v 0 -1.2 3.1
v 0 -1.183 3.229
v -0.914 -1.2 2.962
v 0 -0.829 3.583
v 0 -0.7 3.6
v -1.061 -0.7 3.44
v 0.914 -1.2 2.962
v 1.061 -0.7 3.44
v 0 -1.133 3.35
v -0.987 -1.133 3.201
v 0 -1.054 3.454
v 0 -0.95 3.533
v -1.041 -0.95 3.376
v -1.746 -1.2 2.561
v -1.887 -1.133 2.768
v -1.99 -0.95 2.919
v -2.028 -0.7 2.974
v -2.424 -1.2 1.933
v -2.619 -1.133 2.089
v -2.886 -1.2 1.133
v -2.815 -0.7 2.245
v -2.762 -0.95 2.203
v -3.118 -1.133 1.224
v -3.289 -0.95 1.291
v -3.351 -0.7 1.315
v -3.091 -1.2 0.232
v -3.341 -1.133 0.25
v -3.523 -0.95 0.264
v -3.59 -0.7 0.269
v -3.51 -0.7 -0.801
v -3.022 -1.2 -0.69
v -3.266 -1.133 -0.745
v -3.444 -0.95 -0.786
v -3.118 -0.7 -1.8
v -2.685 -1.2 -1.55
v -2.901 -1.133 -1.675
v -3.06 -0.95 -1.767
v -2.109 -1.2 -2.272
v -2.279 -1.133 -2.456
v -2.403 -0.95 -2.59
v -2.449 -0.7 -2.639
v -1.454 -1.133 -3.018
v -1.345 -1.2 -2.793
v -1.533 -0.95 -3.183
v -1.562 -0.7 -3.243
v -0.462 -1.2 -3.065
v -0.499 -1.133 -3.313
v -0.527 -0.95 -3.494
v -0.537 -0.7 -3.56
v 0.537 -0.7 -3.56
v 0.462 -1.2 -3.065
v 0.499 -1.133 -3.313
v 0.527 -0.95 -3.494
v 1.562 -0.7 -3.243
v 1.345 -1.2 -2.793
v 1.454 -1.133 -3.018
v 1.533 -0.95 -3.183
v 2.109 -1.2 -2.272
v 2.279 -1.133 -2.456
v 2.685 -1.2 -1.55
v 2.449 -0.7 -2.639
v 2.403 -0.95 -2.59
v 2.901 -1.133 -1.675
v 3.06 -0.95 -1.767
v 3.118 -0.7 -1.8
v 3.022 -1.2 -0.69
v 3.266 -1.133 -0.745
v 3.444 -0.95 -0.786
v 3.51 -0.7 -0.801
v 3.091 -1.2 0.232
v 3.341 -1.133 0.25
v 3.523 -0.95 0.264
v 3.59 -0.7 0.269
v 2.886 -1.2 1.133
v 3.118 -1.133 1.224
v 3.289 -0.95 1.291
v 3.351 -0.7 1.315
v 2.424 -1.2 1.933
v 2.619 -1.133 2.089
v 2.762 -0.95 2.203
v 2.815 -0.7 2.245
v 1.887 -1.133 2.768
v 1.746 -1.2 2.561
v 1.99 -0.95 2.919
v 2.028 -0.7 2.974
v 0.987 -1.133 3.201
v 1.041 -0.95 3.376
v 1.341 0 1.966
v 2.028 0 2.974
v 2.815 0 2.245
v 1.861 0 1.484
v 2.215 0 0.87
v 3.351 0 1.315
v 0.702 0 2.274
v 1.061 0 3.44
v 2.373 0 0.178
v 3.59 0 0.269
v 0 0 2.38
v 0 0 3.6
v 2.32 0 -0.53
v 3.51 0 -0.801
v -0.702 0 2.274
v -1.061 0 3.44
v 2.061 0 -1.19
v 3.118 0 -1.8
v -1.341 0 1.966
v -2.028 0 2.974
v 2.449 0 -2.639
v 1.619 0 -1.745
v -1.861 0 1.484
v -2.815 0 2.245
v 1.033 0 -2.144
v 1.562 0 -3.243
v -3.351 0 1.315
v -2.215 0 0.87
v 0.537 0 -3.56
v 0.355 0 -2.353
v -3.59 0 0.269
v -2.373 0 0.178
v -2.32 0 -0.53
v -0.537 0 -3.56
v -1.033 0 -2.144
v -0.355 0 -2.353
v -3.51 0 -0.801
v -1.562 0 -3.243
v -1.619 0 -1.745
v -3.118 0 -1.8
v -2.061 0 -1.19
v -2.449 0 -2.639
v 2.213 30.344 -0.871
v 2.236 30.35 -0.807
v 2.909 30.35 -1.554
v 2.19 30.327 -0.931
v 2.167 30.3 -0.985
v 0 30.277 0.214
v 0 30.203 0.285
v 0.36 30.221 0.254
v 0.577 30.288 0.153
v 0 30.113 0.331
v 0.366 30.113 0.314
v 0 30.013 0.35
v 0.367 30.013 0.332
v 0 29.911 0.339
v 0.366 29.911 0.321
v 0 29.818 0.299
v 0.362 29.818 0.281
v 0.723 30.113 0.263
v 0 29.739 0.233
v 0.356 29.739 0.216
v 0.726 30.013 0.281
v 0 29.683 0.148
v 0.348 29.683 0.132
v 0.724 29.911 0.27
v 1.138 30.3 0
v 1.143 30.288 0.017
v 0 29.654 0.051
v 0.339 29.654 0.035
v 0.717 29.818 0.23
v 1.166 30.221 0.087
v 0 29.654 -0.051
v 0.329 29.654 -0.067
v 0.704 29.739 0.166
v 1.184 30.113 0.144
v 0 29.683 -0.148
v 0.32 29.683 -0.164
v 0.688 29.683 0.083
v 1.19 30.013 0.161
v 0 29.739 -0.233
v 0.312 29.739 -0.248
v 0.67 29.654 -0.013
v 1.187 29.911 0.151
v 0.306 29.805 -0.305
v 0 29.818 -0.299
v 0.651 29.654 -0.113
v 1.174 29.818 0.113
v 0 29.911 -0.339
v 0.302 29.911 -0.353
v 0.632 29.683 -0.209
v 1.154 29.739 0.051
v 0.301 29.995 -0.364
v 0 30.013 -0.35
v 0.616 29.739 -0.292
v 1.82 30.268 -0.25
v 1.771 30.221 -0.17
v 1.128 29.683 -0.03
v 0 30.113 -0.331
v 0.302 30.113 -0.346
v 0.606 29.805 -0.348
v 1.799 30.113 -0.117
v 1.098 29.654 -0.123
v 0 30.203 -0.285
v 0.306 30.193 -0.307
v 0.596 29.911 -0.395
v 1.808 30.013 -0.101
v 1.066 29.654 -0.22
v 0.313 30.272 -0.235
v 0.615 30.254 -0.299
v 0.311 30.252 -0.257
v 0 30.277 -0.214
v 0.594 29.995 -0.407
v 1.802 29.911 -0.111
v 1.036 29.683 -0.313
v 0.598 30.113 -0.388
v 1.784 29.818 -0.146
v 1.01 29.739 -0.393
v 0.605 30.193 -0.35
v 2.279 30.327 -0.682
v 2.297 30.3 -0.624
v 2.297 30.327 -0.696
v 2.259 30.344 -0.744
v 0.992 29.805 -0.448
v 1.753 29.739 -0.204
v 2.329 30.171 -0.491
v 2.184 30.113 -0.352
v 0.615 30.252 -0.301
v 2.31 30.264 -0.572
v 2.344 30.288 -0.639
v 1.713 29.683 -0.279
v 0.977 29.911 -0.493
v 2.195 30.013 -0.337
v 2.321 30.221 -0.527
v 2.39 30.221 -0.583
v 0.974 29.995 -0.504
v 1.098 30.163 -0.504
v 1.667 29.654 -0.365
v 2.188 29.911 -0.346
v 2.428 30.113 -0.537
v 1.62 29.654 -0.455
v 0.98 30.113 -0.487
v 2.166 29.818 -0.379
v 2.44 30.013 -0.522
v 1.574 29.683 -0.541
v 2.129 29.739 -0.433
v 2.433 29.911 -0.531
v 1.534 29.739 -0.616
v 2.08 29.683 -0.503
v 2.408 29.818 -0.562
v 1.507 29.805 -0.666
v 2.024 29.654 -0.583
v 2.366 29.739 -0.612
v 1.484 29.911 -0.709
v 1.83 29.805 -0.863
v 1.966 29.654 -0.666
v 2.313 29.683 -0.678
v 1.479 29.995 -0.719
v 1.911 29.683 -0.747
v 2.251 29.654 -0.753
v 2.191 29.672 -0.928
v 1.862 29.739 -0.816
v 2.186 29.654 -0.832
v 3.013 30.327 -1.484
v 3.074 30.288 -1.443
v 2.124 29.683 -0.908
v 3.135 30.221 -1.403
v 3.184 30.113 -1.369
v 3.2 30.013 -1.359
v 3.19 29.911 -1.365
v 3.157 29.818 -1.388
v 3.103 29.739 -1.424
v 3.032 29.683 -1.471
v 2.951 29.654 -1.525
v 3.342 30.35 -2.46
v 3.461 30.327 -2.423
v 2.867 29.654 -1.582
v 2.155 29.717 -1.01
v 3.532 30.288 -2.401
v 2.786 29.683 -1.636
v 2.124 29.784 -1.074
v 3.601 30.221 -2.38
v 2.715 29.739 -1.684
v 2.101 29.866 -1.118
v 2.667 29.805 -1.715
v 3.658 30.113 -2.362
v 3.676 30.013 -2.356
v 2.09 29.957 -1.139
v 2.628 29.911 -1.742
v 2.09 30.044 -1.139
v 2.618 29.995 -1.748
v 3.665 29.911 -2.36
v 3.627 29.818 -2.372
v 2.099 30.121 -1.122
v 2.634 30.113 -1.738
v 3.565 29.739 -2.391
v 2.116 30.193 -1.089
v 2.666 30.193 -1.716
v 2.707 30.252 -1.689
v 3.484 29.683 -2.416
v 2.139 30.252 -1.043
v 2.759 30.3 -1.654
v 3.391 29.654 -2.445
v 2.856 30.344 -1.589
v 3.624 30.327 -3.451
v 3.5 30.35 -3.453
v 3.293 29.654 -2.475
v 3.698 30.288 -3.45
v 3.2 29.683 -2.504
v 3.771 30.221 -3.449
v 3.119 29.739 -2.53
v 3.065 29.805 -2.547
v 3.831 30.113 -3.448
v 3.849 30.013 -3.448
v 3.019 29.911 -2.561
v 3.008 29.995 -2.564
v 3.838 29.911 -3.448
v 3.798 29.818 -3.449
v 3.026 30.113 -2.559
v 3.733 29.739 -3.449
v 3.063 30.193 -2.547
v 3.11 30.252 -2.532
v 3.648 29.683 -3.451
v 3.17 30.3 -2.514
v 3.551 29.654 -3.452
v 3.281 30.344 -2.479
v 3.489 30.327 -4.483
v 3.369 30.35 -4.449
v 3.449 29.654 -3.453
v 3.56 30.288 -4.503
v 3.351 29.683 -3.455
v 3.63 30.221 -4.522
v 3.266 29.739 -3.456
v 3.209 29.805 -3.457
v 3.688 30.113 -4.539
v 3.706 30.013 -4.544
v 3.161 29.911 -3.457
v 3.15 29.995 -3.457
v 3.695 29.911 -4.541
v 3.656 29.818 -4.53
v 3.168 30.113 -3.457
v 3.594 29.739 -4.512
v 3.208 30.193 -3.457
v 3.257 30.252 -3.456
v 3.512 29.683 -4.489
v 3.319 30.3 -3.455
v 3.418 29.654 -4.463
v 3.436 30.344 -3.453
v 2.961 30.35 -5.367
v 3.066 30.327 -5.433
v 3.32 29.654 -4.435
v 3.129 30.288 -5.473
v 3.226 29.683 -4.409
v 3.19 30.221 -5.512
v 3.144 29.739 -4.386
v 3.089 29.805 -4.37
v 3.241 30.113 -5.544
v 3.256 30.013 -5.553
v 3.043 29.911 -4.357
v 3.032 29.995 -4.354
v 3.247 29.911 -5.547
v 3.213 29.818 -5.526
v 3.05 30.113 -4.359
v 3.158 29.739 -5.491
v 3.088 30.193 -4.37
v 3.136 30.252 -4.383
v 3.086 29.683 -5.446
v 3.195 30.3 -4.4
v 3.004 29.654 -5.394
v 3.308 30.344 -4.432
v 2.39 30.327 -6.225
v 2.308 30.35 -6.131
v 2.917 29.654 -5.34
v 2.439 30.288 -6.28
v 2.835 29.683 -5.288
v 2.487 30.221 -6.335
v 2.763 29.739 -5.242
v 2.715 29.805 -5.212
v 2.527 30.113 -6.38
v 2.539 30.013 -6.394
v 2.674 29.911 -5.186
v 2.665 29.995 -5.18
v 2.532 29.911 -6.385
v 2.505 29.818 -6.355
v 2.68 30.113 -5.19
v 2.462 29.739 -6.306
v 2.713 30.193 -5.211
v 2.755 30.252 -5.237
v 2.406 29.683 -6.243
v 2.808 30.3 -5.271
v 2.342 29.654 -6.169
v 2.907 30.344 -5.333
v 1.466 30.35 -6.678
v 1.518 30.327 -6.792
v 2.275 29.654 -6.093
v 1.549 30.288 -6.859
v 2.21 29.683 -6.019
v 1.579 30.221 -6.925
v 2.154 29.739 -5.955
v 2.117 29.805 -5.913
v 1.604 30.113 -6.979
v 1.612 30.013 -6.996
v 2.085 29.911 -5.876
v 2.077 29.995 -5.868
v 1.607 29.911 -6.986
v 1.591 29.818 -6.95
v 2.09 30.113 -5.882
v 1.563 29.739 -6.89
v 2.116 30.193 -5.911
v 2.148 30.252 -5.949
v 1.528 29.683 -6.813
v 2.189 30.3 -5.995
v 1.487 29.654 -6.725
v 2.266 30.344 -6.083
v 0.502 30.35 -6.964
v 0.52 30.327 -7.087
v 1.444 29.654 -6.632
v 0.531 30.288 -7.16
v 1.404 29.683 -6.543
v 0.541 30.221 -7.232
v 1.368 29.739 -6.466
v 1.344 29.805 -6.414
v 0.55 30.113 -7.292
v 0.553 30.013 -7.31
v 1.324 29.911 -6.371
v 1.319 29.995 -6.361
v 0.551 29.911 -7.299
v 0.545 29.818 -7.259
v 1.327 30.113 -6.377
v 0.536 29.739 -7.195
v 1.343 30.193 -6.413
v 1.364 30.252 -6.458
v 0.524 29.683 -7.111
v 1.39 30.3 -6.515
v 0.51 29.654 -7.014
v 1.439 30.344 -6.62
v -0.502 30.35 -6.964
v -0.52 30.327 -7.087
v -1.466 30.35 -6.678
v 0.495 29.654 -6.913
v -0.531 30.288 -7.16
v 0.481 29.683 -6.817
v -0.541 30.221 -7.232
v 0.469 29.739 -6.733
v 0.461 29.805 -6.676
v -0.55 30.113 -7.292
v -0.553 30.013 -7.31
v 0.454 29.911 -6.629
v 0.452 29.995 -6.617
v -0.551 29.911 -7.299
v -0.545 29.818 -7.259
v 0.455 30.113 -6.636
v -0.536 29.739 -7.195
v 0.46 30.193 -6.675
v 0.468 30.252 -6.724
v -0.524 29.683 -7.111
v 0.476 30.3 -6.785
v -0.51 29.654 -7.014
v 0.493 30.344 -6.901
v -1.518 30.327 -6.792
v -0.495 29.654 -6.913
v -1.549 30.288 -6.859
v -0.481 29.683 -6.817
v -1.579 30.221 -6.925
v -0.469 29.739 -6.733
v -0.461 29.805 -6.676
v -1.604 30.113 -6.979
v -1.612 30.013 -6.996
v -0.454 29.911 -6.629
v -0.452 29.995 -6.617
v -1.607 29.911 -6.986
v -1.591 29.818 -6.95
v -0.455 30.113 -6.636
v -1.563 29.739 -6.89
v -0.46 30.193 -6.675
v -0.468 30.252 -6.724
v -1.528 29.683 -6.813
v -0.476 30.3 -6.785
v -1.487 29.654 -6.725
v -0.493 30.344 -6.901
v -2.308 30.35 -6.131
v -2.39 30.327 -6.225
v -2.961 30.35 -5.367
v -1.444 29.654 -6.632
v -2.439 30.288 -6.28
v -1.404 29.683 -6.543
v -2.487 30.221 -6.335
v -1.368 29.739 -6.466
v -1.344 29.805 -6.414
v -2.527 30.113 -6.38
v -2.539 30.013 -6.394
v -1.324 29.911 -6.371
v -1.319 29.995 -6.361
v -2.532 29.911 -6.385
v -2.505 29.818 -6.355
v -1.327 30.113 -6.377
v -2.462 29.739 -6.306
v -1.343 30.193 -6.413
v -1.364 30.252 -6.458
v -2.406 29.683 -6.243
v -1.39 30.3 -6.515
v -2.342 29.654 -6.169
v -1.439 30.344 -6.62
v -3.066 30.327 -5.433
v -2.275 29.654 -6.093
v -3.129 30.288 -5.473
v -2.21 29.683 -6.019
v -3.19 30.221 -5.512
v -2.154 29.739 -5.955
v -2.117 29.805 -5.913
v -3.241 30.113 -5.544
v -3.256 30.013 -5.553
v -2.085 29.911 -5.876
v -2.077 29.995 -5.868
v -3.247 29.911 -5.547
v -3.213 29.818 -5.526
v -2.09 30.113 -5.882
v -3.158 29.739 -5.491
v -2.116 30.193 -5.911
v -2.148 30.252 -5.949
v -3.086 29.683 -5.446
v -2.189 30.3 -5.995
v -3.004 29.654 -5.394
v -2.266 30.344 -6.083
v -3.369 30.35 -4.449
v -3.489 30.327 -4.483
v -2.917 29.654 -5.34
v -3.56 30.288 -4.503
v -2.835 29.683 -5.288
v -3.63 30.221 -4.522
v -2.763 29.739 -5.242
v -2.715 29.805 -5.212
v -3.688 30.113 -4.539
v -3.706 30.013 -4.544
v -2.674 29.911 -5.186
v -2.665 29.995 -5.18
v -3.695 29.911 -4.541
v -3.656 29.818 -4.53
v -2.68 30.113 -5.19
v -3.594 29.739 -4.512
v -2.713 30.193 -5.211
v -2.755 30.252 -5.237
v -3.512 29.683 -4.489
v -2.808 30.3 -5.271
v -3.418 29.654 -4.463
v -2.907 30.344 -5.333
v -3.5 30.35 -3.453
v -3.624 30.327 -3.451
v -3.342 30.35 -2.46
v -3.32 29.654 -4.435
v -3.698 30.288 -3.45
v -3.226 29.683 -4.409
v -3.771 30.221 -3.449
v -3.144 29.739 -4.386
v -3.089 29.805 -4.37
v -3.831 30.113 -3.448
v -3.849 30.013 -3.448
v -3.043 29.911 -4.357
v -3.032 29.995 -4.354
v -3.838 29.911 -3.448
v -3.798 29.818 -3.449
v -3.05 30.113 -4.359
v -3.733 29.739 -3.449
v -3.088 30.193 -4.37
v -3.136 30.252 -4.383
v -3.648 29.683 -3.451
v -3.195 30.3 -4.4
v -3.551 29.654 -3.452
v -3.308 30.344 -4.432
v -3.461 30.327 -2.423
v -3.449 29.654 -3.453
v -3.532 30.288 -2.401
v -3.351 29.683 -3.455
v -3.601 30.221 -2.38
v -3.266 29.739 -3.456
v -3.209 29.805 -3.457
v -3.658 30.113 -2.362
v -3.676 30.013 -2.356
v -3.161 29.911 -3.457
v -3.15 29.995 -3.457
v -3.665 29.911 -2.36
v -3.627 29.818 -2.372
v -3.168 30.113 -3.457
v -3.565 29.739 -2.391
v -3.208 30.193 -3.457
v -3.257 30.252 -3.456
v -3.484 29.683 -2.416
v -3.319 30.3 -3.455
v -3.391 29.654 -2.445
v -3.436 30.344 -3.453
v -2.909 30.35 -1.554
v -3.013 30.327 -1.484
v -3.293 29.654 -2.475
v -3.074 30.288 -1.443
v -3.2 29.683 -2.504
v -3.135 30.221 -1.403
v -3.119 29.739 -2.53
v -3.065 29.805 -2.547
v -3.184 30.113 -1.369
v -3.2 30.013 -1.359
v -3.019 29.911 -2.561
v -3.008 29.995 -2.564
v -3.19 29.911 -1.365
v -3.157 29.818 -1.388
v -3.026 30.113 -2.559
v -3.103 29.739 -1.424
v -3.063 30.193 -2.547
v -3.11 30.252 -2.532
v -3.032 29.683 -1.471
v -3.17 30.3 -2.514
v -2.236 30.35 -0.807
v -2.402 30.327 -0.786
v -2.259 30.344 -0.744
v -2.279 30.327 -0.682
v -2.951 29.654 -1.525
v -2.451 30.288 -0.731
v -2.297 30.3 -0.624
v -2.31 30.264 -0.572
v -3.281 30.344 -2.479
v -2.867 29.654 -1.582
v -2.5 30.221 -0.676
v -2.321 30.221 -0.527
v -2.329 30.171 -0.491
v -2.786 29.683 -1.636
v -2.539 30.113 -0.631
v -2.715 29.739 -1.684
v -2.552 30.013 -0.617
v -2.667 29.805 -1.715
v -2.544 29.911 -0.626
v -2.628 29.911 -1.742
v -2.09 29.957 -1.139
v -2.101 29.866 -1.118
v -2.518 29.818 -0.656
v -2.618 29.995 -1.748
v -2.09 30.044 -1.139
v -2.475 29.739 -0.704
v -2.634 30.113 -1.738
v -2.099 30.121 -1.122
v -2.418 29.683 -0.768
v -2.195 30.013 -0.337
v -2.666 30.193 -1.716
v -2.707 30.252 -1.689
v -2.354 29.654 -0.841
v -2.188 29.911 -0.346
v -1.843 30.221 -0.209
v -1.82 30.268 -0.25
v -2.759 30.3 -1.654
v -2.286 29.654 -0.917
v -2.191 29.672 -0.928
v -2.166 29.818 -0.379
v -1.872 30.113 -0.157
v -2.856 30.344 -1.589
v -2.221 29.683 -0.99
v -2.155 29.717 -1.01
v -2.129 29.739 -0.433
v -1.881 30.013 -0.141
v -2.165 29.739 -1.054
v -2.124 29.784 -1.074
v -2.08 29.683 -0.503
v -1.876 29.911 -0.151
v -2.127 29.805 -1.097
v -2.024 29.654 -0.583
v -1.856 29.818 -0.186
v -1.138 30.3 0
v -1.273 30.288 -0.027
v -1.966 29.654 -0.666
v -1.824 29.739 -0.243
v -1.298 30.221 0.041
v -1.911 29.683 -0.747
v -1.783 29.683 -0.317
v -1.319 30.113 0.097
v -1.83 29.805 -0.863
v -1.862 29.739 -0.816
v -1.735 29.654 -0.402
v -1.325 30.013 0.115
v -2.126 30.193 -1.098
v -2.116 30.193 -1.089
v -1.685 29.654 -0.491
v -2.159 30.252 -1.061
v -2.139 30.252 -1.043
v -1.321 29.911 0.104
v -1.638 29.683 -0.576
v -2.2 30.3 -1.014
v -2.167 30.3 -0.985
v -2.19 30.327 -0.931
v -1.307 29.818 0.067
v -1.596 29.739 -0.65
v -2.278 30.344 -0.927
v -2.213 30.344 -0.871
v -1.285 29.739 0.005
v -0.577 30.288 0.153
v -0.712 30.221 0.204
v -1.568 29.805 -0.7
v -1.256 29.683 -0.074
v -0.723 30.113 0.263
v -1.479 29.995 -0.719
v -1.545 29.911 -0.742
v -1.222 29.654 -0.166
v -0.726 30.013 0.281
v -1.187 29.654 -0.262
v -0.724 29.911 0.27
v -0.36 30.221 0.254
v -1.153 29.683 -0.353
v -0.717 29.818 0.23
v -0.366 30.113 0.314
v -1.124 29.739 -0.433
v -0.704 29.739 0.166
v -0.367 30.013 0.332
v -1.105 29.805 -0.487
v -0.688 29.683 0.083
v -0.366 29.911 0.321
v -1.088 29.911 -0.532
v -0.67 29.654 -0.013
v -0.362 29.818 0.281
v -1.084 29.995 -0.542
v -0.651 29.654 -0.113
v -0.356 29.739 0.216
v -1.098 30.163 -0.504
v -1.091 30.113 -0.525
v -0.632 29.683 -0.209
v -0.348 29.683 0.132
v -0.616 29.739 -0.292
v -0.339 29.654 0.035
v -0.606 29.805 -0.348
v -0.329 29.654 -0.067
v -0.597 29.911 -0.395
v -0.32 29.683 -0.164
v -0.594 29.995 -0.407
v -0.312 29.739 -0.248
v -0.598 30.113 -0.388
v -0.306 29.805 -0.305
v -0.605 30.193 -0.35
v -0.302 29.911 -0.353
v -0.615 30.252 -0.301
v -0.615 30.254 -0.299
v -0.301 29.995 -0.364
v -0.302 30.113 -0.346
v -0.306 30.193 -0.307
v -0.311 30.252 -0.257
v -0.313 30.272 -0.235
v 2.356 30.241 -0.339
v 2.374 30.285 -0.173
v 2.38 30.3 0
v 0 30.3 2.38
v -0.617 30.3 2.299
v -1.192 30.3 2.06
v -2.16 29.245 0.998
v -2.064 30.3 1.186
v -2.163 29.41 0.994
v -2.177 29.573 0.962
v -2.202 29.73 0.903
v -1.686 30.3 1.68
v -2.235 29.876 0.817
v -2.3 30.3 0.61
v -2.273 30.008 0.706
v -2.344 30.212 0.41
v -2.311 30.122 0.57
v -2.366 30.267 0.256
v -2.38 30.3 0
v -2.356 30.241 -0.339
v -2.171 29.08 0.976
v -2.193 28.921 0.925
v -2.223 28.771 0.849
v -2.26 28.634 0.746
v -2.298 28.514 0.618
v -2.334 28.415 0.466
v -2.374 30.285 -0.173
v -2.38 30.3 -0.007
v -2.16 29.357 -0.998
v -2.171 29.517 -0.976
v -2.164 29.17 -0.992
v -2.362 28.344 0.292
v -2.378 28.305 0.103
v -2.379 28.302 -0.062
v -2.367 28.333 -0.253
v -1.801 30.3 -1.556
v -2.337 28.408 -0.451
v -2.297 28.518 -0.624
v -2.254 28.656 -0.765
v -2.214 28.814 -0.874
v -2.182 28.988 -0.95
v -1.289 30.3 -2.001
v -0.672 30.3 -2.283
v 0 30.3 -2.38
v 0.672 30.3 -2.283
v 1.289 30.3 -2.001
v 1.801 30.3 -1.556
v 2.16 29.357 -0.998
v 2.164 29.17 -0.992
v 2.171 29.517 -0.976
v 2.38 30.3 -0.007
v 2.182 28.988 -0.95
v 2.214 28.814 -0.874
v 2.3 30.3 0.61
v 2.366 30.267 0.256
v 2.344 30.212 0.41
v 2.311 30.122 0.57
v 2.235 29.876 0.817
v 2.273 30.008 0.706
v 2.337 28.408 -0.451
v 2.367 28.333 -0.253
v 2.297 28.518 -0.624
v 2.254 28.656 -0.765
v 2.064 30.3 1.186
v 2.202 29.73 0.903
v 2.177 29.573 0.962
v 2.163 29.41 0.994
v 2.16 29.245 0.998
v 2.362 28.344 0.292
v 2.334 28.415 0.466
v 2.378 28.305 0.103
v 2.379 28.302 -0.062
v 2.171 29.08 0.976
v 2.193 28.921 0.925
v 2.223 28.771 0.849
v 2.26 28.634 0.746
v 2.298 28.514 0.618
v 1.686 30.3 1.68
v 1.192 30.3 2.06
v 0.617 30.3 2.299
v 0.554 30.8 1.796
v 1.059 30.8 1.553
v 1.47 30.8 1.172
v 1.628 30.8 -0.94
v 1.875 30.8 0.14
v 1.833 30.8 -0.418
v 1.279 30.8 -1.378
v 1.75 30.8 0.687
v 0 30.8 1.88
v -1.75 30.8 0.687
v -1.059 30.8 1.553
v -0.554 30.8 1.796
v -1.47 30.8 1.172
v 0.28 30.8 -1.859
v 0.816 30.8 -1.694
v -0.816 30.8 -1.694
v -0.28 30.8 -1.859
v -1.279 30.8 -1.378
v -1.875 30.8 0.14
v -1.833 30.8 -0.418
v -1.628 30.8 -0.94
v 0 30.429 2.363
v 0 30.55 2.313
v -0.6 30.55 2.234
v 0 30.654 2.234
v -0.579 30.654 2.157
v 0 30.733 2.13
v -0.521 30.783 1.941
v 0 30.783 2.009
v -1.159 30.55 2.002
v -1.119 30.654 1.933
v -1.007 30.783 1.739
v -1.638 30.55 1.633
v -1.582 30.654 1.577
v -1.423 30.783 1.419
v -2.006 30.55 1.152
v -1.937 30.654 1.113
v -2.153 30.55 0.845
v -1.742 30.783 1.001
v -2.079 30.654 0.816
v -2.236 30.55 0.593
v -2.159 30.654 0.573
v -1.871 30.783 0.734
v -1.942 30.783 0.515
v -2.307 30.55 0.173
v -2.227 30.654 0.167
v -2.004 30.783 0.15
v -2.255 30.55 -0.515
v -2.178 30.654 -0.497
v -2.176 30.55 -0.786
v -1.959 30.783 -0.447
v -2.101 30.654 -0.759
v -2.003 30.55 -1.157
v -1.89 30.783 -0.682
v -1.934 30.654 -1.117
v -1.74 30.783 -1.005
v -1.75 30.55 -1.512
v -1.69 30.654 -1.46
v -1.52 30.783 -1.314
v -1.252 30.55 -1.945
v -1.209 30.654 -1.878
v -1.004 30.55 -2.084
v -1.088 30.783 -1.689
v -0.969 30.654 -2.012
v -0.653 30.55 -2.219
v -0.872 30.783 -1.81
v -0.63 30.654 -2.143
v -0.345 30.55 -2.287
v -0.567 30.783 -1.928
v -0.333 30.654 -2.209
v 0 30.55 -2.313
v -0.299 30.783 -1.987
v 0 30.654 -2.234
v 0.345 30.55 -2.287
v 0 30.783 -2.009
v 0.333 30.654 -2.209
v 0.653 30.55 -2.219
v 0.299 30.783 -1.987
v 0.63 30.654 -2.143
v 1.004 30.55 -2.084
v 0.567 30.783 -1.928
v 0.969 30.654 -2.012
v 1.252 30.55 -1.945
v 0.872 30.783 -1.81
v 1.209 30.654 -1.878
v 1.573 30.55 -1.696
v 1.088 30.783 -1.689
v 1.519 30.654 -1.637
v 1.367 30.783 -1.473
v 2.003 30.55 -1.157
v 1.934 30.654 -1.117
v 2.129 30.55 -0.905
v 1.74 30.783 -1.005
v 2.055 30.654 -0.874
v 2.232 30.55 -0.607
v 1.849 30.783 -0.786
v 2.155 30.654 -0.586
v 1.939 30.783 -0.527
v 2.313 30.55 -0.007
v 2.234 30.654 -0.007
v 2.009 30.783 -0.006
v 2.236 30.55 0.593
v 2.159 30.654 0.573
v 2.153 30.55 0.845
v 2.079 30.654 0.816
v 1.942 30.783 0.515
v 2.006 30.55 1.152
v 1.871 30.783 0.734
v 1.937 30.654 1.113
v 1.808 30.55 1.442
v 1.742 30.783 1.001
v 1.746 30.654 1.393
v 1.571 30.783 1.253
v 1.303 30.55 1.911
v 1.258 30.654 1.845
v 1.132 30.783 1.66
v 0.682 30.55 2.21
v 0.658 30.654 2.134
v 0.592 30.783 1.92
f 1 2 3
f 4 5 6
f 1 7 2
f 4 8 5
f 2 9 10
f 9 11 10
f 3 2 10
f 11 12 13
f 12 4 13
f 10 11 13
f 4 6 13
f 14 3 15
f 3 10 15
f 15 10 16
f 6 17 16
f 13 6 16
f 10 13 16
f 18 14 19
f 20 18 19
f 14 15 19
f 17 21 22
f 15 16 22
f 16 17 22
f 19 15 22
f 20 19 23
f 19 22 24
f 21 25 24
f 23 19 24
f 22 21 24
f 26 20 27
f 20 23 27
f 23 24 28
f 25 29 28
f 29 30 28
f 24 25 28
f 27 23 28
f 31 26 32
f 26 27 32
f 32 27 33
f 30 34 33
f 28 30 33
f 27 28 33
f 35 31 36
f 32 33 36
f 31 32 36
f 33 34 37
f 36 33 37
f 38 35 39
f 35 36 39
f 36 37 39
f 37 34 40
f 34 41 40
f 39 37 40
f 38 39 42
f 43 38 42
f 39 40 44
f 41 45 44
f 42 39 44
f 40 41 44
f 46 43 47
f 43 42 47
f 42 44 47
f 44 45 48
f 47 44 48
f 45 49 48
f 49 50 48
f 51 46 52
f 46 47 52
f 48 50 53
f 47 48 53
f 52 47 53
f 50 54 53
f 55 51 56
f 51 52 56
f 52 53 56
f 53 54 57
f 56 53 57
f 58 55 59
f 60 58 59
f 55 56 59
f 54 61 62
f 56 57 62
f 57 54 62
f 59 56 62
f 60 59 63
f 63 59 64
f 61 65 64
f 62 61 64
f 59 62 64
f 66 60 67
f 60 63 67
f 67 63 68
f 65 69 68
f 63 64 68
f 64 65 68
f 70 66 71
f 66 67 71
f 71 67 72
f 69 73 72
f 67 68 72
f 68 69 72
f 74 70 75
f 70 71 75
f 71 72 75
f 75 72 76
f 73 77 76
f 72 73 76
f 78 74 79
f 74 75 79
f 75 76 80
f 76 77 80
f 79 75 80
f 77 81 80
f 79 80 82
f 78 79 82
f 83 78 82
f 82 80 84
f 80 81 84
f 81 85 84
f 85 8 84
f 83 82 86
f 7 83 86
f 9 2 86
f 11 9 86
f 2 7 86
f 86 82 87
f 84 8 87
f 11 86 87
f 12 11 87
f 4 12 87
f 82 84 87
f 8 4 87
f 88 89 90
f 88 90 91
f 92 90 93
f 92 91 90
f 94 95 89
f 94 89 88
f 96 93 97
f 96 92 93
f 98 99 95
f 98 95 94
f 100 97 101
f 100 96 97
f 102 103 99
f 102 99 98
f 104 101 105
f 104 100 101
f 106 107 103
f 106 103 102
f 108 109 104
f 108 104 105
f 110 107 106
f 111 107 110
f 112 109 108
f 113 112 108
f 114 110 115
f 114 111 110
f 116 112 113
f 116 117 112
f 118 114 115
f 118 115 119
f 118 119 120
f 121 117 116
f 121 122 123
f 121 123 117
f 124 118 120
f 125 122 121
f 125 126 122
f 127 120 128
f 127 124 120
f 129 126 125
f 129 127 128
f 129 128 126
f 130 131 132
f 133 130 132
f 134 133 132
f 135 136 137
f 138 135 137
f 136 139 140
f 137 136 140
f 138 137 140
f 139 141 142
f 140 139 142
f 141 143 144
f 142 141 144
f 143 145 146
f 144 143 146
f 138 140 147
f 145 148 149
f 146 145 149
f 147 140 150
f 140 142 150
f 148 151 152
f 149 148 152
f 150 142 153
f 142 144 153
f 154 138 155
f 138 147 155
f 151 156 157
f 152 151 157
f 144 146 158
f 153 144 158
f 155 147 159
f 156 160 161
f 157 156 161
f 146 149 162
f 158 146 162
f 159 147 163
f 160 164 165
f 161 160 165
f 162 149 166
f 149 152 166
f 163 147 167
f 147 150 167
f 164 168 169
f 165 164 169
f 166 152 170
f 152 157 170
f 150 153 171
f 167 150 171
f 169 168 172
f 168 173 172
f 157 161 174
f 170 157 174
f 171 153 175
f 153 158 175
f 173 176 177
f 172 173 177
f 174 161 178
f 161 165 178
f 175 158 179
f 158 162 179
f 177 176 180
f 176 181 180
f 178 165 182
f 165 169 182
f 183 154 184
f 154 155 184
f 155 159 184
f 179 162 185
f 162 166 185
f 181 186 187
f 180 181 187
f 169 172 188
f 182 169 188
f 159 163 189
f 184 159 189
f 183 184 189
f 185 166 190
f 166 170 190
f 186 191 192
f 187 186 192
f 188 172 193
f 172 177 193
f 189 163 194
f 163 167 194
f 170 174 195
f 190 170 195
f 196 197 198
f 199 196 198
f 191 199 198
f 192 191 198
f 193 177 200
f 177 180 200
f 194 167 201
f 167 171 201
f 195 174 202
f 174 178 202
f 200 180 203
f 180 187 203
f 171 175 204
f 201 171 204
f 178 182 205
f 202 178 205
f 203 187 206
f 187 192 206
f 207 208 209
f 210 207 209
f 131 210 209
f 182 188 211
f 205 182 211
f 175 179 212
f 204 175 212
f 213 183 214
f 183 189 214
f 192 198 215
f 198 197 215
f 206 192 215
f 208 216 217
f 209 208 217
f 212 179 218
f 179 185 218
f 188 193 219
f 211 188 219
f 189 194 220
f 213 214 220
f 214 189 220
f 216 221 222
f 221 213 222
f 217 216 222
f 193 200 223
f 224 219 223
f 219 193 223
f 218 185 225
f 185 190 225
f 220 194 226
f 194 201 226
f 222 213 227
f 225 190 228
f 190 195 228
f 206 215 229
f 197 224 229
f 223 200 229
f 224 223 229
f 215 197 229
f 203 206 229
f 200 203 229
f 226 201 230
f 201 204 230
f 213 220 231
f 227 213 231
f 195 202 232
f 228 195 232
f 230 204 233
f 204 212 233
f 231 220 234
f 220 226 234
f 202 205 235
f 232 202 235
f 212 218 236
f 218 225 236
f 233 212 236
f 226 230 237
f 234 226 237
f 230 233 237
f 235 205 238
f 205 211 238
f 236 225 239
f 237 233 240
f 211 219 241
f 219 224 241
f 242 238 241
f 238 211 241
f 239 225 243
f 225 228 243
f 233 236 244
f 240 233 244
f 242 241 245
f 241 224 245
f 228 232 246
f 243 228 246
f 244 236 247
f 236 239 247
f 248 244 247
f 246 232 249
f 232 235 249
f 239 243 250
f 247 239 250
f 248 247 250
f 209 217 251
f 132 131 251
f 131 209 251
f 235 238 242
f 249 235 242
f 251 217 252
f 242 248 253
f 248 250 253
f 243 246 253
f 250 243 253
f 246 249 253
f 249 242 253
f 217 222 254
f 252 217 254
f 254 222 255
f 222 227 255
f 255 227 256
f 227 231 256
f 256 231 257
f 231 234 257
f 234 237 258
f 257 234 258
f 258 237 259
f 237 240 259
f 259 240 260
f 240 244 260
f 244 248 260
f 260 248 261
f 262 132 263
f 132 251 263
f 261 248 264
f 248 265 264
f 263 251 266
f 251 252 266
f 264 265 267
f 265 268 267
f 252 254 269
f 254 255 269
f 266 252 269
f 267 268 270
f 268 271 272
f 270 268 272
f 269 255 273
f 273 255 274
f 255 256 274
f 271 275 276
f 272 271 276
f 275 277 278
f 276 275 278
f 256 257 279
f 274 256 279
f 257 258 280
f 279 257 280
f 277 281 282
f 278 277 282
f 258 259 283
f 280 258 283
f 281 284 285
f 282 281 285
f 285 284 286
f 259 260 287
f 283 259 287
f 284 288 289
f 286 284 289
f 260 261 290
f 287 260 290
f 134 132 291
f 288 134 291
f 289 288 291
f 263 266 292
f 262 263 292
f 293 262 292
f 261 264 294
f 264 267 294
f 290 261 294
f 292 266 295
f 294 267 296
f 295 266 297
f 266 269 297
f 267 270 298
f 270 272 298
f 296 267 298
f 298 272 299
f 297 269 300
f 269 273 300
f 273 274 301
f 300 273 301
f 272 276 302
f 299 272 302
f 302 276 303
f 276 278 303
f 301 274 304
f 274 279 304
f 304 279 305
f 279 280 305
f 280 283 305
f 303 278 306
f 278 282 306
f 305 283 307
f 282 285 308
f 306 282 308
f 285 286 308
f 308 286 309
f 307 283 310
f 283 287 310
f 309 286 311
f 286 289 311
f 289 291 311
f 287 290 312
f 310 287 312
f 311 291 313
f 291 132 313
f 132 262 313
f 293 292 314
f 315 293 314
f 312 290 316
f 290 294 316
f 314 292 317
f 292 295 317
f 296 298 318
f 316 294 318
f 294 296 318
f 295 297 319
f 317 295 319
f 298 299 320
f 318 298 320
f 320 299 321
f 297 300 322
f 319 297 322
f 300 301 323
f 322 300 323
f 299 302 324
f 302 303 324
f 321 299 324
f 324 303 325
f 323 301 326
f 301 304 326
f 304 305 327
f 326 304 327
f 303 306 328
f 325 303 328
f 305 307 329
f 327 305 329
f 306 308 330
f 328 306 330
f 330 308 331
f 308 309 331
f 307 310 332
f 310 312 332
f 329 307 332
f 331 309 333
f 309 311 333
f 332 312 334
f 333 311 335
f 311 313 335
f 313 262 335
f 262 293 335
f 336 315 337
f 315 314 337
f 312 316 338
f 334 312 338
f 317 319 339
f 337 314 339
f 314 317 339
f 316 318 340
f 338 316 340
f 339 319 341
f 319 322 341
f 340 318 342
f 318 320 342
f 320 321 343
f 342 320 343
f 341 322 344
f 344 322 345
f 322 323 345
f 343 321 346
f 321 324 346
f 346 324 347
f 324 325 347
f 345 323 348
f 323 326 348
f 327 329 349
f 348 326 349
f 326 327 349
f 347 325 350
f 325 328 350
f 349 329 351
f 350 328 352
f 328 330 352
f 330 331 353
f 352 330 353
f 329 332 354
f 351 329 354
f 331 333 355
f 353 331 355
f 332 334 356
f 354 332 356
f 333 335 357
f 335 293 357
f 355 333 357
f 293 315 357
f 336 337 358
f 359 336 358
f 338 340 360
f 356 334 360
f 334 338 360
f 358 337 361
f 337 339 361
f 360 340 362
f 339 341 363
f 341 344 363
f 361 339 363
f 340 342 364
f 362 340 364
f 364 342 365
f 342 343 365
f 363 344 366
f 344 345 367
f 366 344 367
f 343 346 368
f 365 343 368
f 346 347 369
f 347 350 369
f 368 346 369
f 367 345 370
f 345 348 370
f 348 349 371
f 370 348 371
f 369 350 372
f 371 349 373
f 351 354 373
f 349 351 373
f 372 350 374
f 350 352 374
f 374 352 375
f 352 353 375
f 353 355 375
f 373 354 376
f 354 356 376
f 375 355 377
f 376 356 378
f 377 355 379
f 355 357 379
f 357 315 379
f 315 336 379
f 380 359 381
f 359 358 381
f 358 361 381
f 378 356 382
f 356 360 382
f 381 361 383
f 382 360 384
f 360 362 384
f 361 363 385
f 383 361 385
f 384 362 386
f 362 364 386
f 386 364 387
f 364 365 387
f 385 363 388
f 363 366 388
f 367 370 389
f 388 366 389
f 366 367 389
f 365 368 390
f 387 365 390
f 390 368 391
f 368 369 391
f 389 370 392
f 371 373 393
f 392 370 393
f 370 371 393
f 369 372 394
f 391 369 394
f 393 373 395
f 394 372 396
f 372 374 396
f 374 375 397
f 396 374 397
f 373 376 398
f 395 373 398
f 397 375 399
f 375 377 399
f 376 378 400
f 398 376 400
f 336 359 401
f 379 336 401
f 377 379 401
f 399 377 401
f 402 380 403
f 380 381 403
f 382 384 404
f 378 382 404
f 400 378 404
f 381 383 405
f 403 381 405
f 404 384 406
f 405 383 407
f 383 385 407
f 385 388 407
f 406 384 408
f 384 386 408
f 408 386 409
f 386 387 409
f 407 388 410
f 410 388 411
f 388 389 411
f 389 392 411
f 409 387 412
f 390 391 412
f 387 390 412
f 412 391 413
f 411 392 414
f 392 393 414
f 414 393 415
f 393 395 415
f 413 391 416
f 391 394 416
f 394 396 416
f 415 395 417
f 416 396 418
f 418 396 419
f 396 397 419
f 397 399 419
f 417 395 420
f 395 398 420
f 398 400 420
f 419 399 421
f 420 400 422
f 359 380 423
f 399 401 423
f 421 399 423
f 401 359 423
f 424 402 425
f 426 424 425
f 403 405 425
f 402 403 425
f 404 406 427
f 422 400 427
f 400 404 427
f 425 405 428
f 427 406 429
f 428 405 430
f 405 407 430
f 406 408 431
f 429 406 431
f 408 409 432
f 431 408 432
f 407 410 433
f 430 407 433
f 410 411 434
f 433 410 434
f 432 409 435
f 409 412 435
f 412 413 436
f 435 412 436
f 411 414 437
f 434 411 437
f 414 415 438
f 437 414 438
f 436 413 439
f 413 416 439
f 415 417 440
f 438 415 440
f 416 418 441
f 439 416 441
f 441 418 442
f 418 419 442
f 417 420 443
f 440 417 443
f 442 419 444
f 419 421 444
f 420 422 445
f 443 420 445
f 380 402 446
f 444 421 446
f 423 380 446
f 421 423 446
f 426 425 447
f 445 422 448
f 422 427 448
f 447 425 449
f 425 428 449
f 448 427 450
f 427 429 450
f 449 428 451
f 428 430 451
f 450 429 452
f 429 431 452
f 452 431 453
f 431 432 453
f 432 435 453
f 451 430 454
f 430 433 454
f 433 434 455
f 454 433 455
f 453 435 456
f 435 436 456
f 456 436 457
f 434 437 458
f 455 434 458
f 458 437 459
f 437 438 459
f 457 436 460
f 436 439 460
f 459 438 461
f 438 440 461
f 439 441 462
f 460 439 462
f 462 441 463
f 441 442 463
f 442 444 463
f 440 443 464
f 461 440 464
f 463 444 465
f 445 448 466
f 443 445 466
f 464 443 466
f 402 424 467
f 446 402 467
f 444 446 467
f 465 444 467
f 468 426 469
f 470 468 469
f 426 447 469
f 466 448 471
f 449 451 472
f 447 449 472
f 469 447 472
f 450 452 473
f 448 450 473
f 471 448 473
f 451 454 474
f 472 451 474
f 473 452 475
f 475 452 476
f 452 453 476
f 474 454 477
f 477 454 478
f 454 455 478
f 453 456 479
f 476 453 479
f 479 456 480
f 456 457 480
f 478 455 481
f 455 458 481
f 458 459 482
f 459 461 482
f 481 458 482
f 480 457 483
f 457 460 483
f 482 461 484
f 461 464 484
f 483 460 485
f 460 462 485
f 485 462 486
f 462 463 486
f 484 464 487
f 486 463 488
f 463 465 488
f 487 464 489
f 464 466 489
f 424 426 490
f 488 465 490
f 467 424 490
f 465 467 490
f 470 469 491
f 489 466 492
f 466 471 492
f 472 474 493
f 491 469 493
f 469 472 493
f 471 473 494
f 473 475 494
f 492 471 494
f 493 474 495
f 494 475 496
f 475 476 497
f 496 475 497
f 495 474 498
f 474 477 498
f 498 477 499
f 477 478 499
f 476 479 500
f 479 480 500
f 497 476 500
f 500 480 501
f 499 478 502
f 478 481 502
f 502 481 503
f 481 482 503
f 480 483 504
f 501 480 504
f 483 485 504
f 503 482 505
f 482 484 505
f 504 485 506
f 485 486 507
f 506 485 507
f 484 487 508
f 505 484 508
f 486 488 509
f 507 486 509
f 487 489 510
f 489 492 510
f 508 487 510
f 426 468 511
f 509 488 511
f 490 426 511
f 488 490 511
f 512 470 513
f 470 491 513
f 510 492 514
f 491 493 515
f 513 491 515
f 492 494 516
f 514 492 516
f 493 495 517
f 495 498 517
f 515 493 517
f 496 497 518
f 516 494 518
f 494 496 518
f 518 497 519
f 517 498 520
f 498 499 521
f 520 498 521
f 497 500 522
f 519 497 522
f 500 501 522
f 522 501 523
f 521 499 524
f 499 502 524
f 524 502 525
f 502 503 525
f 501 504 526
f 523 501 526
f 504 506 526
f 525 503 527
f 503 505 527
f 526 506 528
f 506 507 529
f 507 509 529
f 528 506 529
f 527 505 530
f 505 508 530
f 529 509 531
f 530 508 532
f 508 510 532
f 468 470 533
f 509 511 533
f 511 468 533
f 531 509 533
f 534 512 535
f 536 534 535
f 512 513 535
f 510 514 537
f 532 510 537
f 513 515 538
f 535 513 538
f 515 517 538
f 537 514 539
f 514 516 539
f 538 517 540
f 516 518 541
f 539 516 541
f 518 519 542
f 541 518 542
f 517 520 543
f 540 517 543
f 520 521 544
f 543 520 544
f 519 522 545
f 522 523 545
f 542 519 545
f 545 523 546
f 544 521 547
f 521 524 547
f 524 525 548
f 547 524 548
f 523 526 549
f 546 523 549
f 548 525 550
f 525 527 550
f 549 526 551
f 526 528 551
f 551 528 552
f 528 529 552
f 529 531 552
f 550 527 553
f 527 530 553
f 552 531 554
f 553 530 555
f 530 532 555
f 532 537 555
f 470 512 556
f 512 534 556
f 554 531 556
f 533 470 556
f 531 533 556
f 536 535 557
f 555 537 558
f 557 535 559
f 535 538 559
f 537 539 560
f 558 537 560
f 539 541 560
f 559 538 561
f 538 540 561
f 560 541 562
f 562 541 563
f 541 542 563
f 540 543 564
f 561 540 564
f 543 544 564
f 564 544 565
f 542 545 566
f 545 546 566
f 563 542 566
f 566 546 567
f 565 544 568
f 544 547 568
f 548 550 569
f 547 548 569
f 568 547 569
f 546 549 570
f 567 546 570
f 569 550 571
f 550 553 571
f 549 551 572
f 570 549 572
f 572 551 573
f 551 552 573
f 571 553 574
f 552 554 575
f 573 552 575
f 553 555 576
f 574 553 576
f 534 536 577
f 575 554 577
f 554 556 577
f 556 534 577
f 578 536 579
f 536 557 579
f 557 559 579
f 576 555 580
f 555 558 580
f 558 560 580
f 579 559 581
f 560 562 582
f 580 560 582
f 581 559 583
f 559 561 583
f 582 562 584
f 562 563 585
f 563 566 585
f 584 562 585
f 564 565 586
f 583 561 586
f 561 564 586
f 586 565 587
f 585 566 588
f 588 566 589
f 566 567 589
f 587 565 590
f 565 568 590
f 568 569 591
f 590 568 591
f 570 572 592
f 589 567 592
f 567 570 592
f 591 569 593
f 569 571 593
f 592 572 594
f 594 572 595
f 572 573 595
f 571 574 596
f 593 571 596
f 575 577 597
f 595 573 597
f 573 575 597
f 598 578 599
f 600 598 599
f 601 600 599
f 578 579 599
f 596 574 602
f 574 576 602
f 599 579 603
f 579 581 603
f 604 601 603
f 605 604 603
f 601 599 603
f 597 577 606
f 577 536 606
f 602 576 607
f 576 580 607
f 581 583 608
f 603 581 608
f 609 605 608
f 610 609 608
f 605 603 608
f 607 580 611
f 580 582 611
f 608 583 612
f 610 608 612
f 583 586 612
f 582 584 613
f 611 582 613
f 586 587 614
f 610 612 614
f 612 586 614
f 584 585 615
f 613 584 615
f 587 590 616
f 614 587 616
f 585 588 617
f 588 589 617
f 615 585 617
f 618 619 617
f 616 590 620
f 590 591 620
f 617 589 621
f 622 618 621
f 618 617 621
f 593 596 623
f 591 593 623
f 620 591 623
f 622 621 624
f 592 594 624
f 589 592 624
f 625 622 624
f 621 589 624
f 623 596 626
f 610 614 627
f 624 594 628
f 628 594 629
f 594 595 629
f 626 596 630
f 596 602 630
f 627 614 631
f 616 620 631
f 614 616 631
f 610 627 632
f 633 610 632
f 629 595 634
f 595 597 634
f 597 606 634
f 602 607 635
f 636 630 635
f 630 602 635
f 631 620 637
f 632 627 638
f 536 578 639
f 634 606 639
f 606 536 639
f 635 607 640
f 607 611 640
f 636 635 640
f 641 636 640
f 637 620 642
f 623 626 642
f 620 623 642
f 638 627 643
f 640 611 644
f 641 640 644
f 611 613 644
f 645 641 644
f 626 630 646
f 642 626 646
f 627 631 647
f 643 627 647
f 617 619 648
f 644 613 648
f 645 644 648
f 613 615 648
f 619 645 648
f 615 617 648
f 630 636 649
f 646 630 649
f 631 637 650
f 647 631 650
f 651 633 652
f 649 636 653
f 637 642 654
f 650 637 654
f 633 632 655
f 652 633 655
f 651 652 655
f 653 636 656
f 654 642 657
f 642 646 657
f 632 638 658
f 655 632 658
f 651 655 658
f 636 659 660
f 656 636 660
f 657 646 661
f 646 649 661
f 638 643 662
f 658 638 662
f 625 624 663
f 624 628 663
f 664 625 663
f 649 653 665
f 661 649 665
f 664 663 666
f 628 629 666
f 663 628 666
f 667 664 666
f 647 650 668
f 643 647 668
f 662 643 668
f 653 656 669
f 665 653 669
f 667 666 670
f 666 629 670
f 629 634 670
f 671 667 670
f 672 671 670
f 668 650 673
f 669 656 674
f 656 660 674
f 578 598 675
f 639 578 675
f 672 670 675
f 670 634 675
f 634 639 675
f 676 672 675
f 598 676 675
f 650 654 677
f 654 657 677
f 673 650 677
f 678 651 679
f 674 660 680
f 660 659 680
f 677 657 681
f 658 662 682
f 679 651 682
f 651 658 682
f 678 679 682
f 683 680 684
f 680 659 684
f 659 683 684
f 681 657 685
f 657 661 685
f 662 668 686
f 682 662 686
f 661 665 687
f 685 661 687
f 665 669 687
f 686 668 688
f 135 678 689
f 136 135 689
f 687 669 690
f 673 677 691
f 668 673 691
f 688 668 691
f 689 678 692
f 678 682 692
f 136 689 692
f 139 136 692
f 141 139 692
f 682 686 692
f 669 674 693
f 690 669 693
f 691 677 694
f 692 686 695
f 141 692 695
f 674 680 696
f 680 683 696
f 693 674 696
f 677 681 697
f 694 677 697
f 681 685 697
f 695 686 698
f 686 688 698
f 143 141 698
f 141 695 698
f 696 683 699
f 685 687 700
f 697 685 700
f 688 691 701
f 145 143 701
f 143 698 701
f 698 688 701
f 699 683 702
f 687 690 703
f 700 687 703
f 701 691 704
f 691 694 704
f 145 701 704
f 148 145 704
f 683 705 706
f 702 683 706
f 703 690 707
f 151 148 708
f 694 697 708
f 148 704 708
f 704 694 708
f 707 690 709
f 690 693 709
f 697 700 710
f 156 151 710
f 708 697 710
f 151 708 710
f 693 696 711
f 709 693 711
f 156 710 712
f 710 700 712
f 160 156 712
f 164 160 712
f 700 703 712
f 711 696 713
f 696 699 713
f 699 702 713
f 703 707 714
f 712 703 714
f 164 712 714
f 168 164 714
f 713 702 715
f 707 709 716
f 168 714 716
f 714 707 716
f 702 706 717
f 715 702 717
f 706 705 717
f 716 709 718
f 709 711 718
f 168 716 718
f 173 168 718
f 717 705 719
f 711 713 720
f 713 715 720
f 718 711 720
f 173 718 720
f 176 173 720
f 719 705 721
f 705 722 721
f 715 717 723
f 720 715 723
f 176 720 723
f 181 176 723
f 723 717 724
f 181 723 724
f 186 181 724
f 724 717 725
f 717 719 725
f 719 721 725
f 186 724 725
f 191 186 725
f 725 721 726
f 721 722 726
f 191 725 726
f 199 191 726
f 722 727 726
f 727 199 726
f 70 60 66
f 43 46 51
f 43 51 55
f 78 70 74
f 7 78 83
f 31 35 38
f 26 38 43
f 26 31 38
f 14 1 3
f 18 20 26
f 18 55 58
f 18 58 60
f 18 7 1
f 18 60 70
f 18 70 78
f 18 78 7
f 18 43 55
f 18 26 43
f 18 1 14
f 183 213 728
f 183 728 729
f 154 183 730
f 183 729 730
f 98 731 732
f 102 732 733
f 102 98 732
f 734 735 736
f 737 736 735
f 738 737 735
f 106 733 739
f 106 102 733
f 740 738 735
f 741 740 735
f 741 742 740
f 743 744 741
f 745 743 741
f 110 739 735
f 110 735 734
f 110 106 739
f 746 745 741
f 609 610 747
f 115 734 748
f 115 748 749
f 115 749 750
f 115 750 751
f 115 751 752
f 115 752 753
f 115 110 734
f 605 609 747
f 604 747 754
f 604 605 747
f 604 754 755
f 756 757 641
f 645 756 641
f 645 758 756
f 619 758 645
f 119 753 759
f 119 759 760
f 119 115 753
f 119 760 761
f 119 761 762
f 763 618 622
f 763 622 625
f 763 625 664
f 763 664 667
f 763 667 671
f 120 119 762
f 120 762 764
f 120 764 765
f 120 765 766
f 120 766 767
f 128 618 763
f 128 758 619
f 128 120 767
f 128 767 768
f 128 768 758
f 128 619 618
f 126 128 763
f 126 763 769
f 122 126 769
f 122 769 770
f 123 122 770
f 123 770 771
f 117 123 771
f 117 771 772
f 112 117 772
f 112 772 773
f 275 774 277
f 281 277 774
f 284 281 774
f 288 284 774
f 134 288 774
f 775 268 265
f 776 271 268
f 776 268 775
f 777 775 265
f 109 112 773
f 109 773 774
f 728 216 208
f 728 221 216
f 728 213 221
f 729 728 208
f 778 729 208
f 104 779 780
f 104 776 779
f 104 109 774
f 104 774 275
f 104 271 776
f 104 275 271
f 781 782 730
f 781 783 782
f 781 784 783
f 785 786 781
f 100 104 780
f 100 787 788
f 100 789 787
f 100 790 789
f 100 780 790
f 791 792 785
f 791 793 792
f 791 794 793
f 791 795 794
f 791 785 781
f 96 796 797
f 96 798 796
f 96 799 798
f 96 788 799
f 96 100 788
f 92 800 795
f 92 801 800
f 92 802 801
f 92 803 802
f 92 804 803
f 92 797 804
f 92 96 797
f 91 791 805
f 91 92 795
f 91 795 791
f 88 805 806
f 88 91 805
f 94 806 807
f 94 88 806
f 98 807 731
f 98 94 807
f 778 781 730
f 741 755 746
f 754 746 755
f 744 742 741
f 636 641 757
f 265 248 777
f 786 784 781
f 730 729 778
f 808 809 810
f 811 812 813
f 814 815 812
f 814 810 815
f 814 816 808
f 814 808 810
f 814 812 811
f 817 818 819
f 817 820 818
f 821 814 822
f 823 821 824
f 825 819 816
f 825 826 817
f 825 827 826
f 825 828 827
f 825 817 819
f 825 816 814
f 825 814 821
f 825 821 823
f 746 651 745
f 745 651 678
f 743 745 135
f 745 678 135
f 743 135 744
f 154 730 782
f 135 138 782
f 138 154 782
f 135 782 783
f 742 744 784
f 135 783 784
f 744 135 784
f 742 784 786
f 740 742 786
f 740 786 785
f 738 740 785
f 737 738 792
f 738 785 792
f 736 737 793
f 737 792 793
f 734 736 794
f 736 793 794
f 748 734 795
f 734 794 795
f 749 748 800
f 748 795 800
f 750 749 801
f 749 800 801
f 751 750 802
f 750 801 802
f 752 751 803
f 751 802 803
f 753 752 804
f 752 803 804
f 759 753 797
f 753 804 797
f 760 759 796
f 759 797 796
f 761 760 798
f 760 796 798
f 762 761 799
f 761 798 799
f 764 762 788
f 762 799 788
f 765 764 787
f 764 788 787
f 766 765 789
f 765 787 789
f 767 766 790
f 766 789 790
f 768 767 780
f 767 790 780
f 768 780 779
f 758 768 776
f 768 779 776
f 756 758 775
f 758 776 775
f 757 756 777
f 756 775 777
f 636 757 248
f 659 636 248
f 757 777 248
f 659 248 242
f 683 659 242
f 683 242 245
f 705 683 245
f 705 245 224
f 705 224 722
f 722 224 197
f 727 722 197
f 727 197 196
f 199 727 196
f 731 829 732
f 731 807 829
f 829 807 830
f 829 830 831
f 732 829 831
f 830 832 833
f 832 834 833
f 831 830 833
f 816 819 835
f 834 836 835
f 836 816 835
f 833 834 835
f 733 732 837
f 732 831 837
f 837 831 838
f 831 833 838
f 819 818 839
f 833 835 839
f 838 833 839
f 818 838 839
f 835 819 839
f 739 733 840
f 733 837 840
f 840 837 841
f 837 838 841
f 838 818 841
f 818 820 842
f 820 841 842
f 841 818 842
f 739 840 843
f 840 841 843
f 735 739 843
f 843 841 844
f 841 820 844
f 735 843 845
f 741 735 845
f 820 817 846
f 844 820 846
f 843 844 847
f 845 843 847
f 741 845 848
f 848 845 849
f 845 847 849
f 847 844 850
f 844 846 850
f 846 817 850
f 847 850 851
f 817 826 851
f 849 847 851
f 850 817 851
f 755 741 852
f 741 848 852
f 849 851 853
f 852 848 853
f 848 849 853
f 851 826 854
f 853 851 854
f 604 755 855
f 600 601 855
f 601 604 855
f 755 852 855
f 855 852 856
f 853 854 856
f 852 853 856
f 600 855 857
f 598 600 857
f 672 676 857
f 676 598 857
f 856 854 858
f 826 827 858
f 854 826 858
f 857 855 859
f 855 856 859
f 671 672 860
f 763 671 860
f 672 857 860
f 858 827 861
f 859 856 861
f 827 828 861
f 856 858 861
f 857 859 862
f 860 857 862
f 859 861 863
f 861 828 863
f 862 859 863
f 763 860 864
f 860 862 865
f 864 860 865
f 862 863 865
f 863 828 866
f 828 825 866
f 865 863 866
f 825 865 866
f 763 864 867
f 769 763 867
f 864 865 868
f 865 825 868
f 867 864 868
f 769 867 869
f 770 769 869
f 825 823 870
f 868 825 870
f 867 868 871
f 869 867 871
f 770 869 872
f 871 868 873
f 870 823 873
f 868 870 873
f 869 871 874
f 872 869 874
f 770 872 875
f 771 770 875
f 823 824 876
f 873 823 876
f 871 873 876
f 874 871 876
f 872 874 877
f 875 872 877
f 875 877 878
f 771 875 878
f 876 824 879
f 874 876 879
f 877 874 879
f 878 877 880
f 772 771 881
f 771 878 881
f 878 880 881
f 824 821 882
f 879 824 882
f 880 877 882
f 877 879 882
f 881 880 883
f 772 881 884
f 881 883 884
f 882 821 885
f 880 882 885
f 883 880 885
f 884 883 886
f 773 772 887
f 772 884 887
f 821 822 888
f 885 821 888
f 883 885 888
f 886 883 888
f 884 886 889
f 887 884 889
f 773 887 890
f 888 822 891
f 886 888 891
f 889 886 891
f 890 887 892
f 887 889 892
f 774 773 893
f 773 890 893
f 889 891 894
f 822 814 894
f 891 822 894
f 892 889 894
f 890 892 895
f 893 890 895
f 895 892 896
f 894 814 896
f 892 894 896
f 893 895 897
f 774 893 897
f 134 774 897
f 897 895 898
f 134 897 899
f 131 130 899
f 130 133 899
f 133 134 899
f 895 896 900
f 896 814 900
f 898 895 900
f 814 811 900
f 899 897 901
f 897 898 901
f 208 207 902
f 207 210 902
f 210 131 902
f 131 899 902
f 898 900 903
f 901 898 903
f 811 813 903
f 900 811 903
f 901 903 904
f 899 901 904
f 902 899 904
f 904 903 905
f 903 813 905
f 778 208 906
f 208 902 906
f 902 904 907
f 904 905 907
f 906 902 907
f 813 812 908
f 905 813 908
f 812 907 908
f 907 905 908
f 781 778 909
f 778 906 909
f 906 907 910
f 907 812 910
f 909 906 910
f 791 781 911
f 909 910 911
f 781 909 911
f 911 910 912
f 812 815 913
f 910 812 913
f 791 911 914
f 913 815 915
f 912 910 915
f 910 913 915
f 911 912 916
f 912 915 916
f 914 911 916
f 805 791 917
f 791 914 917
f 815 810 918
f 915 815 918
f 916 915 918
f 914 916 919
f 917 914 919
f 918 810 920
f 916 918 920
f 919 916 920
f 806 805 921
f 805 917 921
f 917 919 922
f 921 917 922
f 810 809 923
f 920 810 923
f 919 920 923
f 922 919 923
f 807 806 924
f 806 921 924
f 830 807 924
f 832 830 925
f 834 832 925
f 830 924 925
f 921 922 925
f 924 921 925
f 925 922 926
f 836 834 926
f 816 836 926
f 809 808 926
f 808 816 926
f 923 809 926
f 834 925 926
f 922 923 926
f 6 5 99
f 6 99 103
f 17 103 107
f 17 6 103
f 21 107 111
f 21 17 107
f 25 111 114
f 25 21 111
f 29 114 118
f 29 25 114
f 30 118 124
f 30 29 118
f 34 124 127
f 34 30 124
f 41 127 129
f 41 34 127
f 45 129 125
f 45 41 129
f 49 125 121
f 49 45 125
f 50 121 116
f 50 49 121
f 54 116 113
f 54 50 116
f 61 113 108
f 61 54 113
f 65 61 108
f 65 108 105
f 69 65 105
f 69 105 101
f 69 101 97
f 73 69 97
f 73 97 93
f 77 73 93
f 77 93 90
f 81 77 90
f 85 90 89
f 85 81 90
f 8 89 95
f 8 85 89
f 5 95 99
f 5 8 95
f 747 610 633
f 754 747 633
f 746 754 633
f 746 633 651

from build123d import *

# Parameters (mm, degrees)
F2_R     = 1
F3_DEPTH = 12.5
F4_R     = 0.49999
F5_R     = 0.35


# Not quite as in the source:
# - a fillet or chamfer is up to 0.001 mm smaller than in the source, because OpenCascade refuses the exact size


with BuildPart() as f1:
    # F0 (on Right) → F1 (revolve)
    with BuildSketch(Plane.YZ):
        Polygon((-1.2, 3.6), (-1.2, 0), (30.8, 0), (30.8, 2.38), (0, 2.38), (0, 3.6), align=None)
    revolve(axis=Axis((0, 14.8, 0), (0, -1, 0)))

    # F2 (on Right) → F3 (cut, symmetric)
    with BuildSketch(Plane.YZ):
        with Locations((29.3, 0)):
            Circle(F2_R)
    extrude(amount=F3_DEPTH, both=True, mode=Mode.SUBTRACT)

    # F4 (radius 0.5 in the source; OpenCascade refuses exactly that, so slightly less here)
    f4_edges = [f1.edges().sort_by_distance(p)[0] for p in [
        (0, -1.2, -3.6),
        (0, 30.8, -2.38),
    ]]
    fillet(f4_edges, radius=F4_R)

    # F5 (on Right) → F6 (revolve)
    with BuildSketch(Plane.YZ):
        with Locations((30, 0)):
            Circle(F5_R)
    revolve(axis=Axis((0, 28.3114453778, -3.5), (0, 1, 0)))


solid = f1.part
